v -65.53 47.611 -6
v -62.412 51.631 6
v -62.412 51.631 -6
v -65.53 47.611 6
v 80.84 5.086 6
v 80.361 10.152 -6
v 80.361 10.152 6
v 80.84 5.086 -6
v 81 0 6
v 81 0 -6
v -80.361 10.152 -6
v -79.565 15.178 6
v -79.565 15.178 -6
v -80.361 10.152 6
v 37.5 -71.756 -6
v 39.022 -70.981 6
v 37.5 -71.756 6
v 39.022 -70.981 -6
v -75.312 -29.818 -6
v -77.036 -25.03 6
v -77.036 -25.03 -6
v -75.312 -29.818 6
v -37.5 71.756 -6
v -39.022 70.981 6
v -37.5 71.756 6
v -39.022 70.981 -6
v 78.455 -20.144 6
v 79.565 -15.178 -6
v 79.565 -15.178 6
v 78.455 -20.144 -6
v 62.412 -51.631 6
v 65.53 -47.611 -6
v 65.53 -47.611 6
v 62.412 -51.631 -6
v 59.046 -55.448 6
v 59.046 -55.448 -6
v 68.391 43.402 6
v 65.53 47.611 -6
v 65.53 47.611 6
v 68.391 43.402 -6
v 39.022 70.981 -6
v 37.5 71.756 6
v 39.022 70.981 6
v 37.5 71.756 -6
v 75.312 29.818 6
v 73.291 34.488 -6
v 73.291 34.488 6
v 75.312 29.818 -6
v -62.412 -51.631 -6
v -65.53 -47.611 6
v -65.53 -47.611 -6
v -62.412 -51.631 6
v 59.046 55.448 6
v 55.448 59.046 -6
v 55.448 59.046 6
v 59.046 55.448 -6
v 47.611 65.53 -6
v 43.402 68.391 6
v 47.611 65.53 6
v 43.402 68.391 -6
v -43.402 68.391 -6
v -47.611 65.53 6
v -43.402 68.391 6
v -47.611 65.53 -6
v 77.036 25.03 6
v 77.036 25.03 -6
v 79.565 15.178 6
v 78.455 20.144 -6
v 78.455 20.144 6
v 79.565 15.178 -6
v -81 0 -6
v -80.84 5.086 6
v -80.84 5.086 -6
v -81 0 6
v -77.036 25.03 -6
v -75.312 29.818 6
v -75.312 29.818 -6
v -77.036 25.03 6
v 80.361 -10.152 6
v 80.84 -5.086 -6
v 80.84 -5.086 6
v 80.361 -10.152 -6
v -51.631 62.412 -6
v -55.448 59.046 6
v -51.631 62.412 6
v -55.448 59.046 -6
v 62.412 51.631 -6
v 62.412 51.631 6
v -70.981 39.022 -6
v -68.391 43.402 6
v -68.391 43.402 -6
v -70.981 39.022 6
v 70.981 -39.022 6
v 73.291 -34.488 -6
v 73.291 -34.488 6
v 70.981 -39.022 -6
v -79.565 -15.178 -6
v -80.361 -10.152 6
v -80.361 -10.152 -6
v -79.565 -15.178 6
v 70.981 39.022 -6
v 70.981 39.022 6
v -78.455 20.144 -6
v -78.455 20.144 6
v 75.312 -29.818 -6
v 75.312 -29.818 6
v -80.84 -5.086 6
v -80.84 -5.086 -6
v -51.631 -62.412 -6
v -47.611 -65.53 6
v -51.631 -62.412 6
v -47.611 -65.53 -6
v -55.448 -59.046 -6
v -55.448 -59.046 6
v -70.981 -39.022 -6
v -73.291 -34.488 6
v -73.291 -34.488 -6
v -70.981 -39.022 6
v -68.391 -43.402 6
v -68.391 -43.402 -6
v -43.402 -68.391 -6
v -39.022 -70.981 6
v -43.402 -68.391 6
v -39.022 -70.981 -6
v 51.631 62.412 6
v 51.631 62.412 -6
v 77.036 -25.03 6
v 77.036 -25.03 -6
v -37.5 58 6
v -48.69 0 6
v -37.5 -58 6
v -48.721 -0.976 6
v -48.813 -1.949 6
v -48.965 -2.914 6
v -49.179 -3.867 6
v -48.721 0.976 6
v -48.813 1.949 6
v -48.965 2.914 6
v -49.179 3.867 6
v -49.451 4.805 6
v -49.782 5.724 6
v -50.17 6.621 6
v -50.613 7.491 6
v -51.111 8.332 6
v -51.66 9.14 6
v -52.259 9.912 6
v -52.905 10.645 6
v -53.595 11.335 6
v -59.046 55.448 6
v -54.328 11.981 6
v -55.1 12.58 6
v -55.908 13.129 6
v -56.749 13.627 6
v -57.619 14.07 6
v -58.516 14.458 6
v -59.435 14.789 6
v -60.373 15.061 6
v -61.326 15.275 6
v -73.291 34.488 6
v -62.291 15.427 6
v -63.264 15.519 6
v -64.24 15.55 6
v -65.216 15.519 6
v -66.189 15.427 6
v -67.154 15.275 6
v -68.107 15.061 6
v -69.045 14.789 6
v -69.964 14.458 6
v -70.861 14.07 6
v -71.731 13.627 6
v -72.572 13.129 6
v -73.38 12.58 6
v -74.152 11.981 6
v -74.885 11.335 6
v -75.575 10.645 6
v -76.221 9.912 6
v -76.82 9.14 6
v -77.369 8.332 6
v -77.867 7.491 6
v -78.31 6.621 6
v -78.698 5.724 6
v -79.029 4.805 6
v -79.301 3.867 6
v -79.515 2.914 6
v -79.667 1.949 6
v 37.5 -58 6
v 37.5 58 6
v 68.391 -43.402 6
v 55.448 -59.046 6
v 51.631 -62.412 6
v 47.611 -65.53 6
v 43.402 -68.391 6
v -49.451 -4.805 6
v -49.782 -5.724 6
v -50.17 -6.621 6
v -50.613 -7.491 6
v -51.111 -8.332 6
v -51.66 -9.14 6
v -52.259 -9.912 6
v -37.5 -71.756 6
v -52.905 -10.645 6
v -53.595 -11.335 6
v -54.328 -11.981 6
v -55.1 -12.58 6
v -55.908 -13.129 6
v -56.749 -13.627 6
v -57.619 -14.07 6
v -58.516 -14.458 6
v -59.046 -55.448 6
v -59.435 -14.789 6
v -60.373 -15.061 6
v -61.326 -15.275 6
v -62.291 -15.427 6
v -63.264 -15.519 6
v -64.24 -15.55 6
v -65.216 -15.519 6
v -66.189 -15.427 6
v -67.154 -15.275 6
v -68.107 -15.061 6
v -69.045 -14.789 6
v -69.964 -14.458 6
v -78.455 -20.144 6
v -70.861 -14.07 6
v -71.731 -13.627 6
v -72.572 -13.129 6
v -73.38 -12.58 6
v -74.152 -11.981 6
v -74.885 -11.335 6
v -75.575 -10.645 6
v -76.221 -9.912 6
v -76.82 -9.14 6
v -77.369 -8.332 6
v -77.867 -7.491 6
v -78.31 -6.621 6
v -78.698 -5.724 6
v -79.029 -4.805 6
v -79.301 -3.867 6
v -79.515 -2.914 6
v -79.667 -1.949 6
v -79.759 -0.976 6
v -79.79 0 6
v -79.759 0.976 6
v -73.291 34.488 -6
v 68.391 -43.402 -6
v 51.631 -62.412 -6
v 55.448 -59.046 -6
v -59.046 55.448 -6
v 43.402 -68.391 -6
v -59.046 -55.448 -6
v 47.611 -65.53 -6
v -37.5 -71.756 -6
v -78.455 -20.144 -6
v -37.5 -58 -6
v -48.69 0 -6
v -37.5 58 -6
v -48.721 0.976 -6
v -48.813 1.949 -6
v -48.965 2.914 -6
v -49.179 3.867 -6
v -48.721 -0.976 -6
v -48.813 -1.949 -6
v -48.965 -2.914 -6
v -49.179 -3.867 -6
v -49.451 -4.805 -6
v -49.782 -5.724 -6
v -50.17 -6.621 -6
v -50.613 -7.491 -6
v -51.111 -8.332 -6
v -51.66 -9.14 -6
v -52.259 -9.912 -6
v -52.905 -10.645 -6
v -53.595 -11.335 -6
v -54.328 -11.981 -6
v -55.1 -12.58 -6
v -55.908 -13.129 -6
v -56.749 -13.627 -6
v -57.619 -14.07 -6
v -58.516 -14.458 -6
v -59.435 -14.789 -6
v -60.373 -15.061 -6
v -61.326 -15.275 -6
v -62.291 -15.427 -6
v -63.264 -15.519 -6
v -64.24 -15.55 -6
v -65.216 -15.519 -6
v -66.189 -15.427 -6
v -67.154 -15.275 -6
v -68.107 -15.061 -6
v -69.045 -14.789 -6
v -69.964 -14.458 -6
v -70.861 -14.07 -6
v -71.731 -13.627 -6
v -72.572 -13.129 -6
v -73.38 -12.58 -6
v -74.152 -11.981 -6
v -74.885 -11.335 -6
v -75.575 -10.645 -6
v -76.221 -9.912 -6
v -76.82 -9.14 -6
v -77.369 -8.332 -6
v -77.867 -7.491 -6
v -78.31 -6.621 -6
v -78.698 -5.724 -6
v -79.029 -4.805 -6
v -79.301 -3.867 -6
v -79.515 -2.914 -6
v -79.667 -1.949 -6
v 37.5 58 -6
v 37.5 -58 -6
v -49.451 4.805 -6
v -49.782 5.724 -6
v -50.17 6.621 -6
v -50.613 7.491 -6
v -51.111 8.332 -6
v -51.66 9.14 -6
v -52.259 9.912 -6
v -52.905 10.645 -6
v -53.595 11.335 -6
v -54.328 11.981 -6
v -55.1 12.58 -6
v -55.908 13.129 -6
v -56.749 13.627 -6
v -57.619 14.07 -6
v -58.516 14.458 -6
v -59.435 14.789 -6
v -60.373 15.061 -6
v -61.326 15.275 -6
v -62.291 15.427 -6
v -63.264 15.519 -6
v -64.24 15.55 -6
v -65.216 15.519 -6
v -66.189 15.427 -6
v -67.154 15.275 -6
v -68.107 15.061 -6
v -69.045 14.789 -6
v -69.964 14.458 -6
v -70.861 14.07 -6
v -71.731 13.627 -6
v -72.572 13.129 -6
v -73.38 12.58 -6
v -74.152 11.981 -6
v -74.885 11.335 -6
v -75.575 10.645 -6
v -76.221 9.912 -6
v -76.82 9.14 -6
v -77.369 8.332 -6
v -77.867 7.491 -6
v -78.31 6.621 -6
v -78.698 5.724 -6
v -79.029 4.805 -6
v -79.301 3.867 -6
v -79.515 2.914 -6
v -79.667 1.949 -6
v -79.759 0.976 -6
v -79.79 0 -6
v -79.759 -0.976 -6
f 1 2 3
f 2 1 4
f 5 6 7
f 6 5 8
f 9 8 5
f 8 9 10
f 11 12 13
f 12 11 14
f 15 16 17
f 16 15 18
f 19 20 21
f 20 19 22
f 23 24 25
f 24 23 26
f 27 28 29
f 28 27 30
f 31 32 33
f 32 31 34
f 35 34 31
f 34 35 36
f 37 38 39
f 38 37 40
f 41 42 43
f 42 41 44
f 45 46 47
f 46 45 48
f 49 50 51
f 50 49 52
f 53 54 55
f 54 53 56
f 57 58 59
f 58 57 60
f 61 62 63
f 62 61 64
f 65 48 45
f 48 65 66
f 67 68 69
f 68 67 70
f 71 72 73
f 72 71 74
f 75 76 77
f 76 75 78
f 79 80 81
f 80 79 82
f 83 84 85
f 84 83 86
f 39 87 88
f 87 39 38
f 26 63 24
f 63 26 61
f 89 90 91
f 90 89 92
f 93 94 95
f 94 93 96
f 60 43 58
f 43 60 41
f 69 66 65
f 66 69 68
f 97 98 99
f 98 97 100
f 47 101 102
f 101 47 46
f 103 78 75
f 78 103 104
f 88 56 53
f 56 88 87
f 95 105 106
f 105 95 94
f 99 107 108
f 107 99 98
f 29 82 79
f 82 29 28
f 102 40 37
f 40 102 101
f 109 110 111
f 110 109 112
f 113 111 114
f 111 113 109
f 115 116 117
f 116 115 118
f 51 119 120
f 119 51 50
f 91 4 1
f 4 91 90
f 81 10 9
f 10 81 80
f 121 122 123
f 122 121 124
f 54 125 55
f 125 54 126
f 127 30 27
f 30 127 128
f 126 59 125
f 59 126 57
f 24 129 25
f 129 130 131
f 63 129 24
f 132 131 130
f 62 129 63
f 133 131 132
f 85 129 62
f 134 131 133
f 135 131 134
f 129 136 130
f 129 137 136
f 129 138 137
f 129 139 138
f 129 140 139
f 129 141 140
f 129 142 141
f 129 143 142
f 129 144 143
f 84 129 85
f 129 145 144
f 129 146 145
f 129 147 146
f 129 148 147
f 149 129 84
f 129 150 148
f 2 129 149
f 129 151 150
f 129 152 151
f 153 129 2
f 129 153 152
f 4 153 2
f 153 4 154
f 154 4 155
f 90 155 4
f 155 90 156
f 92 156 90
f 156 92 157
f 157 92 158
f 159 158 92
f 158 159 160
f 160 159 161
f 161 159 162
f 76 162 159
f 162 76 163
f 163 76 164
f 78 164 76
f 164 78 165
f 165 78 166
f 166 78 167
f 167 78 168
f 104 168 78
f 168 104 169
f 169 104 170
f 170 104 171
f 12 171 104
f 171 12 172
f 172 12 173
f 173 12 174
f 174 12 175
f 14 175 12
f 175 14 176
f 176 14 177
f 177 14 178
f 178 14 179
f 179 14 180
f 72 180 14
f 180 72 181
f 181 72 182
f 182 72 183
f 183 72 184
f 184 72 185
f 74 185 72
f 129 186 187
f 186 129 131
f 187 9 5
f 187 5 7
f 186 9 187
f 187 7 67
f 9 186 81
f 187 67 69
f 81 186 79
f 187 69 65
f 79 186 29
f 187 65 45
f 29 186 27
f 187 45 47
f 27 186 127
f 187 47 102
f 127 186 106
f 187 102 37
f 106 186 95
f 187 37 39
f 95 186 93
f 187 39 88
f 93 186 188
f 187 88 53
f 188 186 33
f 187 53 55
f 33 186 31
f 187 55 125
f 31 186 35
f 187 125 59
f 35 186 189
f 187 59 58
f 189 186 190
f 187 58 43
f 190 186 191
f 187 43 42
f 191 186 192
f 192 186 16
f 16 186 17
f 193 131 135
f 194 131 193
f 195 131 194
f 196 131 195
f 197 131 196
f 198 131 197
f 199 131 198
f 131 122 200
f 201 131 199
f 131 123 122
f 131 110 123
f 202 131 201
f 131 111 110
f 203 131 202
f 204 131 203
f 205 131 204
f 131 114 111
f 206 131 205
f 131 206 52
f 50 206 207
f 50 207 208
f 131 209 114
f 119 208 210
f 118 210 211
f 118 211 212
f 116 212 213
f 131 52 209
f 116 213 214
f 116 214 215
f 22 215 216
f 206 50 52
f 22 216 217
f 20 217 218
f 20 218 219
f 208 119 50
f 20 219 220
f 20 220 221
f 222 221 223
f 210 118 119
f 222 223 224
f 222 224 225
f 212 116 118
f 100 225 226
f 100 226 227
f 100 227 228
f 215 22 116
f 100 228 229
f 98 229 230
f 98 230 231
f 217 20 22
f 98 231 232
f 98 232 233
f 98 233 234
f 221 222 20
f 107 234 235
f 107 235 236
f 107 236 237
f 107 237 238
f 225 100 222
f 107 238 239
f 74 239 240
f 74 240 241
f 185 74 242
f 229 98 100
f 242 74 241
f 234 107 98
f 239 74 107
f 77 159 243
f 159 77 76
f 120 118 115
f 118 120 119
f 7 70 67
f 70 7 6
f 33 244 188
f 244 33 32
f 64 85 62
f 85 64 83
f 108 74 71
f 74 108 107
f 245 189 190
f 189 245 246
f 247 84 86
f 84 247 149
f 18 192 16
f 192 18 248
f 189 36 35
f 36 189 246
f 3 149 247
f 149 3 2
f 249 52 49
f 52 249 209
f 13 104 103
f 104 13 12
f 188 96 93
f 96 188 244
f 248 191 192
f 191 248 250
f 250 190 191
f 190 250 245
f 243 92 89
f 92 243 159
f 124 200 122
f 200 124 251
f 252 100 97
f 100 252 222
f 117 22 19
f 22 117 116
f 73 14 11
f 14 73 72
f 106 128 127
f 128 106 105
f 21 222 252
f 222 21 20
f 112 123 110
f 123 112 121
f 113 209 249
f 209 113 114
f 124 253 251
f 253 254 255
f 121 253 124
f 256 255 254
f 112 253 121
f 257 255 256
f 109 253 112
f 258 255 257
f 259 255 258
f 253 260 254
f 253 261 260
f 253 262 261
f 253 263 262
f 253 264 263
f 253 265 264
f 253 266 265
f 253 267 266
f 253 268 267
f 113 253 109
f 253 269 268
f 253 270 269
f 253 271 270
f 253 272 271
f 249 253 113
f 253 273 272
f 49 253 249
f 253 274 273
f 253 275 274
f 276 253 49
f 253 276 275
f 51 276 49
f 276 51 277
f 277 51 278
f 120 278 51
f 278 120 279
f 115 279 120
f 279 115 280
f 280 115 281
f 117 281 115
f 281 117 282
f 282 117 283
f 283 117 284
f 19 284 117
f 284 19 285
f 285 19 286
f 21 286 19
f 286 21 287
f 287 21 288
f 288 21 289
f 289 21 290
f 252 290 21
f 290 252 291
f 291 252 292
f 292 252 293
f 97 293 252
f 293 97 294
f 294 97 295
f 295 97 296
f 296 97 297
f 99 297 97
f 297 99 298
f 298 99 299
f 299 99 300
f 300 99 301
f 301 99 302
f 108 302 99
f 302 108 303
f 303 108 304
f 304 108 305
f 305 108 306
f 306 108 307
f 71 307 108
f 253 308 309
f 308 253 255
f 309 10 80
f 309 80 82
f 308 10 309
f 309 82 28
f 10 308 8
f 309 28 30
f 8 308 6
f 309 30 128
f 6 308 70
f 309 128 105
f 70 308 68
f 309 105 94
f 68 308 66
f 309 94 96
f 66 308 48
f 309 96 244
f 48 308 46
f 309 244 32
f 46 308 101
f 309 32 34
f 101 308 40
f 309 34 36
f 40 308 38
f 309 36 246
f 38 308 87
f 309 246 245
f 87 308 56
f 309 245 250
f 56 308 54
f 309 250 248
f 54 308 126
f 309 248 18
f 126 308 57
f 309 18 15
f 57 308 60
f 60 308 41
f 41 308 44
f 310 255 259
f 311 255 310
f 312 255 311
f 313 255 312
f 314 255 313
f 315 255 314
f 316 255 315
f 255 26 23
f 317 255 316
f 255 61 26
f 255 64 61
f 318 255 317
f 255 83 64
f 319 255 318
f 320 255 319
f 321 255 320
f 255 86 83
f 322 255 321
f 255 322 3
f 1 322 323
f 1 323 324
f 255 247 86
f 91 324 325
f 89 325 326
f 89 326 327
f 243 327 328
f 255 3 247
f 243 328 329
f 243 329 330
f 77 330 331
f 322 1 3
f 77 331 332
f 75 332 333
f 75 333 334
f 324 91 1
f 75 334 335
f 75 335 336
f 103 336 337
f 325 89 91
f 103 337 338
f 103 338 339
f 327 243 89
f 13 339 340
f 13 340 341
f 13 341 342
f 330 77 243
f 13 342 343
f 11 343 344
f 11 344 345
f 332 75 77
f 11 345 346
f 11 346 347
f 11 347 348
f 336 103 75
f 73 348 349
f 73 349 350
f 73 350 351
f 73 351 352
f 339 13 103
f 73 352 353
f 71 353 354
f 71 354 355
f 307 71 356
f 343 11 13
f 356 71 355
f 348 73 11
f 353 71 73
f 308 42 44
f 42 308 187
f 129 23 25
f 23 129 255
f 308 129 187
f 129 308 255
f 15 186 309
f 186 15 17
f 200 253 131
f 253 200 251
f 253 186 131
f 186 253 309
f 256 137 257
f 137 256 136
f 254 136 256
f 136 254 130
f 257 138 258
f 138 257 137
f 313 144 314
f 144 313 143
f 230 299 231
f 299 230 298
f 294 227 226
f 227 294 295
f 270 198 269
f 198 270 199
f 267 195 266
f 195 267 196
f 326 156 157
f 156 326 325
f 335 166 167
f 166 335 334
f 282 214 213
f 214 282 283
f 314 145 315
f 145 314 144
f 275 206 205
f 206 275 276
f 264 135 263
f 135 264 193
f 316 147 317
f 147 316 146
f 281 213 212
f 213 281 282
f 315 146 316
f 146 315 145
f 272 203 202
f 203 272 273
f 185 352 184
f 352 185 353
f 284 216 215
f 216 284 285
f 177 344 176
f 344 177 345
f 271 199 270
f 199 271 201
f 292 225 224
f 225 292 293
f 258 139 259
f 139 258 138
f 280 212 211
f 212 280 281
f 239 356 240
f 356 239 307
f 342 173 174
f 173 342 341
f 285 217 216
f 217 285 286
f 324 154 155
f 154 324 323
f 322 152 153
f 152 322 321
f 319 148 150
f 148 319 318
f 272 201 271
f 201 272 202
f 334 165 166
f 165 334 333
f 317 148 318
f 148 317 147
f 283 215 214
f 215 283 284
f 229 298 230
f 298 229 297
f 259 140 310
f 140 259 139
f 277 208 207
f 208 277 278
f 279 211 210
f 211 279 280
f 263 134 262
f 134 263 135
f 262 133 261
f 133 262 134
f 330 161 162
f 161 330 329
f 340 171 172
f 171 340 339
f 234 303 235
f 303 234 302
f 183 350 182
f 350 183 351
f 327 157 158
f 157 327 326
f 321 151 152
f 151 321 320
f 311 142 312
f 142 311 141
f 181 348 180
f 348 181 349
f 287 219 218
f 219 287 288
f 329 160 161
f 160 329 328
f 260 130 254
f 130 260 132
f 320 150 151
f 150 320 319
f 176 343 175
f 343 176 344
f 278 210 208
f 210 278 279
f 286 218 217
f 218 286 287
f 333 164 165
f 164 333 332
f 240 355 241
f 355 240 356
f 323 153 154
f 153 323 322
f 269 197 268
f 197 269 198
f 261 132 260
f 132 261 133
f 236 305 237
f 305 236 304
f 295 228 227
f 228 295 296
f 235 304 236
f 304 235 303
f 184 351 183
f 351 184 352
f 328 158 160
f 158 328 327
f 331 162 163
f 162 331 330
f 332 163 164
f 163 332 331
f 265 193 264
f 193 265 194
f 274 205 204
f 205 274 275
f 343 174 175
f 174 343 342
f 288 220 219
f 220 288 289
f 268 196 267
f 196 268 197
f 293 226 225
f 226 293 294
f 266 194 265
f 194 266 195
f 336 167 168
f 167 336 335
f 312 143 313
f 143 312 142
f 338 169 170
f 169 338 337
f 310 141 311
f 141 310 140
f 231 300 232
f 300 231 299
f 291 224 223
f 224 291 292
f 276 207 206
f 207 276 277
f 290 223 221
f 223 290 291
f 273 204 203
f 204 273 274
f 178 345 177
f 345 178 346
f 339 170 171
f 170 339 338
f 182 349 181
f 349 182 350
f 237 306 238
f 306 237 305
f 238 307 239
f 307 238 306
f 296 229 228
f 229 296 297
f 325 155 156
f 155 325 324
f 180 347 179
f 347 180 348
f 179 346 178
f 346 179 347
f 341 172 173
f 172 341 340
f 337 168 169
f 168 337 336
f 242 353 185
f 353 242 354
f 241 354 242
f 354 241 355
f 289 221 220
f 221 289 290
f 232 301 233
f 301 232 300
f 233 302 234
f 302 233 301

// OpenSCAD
// romi chassis

// cylinder
h = 12;
fn = 100;
r = 81;

// cutouts
// wheels
l = 75;
w = 30;
offset = 58;
// caster
caster_offset = 64.24;
caster_rad = 15.55;

translate([0, 0, -h/2]){
    difference(){
        // chassis base
        cylinder(h, r=r, $fn=fn);
        // wheels
        translate([-l/2, offset, 0])
        cube([l, w, h]);
        translate([-l/2, -offset-w, 0])
        cube([l, w, h]);
        // caster
        translate([-caster_offset, 0, 0])
        cylinder(h, r=caster_rad, $fn=fn);
    }
}
